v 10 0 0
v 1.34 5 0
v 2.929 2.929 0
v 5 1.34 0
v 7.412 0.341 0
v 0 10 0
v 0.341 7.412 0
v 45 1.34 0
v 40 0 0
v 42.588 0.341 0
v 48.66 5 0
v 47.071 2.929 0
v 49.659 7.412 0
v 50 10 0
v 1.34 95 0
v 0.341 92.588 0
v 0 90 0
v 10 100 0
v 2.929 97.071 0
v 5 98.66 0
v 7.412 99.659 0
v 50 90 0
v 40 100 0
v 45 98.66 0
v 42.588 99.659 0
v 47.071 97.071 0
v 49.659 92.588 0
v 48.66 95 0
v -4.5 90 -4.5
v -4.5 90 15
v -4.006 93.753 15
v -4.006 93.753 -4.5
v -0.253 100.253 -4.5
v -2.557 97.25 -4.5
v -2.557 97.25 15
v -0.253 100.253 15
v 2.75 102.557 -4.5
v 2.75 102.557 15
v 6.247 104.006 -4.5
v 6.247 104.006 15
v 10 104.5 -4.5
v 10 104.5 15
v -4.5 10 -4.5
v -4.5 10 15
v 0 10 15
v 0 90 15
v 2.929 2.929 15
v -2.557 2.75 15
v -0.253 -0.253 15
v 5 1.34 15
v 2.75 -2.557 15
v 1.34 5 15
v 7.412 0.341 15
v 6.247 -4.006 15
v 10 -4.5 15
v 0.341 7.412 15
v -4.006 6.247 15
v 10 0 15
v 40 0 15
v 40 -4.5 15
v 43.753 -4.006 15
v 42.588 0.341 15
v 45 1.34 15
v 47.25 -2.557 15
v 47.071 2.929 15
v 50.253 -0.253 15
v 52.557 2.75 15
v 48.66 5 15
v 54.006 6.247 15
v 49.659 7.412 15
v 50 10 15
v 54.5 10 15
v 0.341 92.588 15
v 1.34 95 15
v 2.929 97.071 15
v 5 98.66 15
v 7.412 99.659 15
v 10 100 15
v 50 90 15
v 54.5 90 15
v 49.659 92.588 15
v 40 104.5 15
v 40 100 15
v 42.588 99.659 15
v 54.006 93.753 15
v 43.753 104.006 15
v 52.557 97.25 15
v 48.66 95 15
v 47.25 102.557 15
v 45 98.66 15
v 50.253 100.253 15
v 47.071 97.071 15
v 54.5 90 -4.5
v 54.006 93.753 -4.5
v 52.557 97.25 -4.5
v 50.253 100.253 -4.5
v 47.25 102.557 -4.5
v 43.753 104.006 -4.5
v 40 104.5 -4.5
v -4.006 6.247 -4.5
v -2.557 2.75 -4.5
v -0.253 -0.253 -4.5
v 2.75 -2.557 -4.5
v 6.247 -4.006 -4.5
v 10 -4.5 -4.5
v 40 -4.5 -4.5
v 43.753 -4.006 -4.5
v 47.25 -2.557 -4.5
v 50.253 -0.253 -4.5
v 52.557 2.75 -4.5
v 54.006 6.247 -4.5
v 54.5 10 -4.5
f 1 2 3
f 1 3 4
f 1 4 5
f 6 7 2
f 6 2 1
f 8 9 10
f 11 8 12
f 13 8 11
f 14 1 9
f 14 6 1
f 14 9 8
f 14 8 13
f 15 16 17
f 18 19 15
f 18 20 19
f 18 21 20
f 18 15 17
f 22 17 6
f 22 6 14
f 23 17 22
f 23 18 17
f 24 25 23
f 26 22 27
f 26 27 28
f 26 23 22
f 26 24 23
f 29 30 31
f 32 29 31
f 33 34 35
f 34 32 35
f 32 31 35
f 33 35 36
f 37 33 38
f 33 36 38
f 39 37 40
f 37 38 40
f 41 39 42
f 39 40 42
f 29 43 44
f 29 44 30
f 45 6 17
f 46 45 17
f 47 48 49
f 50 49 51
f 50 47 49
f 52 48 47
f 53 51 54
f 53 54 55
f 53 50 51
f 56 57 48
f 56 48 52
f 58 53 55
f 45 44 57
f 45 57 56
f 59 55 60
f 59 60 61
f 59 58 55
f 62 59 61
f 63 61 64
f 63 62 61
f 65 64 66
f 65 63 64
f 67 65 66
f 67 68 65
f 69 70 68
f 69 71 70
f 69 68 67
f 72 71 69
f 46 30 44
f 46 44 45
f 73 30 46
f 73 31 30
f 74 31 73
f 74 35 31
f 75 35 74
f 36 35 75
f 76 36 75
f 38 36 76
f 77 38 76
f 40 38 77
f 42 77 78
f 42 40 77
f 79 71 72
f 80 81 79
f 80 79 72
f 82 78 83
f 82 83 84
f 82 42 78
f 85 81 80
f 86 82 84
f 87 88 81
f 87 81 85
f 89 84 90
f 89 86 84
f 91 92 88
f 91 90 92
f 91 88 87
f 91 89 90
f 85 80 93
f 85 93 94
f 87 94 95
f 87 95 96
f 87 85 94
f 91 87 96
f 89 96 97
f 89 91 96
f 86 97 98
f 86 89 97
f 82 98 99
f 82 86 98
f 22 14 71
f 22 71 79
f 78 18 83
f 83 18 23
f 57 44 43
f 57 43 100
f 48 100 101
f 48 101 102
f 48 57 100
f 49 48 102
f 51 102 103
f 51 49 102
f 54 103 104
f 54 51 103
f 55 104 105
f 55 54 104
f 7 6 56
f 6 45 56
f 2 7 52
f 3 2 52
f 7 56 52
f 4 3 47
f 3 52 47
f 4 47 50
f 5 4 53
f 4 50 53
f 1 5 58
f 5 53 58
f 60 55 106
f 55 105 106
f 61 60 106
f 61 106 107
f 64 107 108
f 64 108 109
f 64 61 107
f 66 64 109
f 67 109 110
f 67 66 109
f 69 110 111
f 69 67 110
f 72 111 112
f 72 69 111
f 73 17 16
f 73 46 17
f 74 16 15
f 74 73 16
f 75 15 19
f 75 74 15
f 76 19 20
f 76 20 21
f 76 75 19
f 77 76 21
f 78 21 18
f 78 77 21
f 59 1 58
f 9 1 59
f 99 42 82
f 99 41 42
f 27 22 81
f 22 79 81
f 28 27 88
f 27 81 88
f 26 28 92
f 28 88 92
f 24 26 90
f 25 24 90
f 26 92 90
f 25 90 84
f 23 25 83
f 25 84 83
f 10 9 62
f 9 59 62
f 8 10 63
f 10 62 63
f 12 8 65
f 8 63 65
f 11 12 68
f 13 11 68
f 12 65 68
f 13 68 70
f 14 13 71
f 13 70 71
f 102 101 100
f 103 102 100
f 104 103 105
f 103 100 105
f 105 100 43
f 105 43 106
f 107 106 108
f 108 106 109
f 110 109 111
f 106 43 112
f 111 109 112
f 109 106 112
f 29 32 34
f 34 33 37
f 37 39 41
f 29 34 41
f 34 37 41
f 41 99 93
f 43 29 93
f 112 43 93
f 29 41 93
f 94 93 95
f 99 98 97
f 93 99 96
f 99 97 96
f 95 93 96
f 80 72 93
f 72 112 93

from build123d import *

# Parameters (mm, degrees)
F0_W     = 50
F0_H     = 100
F1_DEPTH = 15
F2_R     = 10
F3_T     = 4.5


with BuildPart() as f1:
    # F0 (on Top) → F1 (new body)
    with BuildSketch(Plane.XY):
        with Locations((25, 50)):
            Rectangle(F0_W, F0_H)
    extrude(amount=F1_DEPTH)

    # F2
    f2_edges = [f1.edges().sort_by_distance(p)[0] for p in [
        (0, 0, 7.5),
        (50, 0, 7.5),
        (50, 100, 7.5),
        (0, 100, 7.5),
    ]]
    fillet(f2_edges, radius=F2_R)

    # F3
    f3_openings = [f1.faces().sort_by_distance(p)[0] for p in [
        (25, 50, 15),
    ]]
    offset(amount=F3_T, openings=f3_openings, kind=Kind.INTERSECTION)


solid = f1.part
